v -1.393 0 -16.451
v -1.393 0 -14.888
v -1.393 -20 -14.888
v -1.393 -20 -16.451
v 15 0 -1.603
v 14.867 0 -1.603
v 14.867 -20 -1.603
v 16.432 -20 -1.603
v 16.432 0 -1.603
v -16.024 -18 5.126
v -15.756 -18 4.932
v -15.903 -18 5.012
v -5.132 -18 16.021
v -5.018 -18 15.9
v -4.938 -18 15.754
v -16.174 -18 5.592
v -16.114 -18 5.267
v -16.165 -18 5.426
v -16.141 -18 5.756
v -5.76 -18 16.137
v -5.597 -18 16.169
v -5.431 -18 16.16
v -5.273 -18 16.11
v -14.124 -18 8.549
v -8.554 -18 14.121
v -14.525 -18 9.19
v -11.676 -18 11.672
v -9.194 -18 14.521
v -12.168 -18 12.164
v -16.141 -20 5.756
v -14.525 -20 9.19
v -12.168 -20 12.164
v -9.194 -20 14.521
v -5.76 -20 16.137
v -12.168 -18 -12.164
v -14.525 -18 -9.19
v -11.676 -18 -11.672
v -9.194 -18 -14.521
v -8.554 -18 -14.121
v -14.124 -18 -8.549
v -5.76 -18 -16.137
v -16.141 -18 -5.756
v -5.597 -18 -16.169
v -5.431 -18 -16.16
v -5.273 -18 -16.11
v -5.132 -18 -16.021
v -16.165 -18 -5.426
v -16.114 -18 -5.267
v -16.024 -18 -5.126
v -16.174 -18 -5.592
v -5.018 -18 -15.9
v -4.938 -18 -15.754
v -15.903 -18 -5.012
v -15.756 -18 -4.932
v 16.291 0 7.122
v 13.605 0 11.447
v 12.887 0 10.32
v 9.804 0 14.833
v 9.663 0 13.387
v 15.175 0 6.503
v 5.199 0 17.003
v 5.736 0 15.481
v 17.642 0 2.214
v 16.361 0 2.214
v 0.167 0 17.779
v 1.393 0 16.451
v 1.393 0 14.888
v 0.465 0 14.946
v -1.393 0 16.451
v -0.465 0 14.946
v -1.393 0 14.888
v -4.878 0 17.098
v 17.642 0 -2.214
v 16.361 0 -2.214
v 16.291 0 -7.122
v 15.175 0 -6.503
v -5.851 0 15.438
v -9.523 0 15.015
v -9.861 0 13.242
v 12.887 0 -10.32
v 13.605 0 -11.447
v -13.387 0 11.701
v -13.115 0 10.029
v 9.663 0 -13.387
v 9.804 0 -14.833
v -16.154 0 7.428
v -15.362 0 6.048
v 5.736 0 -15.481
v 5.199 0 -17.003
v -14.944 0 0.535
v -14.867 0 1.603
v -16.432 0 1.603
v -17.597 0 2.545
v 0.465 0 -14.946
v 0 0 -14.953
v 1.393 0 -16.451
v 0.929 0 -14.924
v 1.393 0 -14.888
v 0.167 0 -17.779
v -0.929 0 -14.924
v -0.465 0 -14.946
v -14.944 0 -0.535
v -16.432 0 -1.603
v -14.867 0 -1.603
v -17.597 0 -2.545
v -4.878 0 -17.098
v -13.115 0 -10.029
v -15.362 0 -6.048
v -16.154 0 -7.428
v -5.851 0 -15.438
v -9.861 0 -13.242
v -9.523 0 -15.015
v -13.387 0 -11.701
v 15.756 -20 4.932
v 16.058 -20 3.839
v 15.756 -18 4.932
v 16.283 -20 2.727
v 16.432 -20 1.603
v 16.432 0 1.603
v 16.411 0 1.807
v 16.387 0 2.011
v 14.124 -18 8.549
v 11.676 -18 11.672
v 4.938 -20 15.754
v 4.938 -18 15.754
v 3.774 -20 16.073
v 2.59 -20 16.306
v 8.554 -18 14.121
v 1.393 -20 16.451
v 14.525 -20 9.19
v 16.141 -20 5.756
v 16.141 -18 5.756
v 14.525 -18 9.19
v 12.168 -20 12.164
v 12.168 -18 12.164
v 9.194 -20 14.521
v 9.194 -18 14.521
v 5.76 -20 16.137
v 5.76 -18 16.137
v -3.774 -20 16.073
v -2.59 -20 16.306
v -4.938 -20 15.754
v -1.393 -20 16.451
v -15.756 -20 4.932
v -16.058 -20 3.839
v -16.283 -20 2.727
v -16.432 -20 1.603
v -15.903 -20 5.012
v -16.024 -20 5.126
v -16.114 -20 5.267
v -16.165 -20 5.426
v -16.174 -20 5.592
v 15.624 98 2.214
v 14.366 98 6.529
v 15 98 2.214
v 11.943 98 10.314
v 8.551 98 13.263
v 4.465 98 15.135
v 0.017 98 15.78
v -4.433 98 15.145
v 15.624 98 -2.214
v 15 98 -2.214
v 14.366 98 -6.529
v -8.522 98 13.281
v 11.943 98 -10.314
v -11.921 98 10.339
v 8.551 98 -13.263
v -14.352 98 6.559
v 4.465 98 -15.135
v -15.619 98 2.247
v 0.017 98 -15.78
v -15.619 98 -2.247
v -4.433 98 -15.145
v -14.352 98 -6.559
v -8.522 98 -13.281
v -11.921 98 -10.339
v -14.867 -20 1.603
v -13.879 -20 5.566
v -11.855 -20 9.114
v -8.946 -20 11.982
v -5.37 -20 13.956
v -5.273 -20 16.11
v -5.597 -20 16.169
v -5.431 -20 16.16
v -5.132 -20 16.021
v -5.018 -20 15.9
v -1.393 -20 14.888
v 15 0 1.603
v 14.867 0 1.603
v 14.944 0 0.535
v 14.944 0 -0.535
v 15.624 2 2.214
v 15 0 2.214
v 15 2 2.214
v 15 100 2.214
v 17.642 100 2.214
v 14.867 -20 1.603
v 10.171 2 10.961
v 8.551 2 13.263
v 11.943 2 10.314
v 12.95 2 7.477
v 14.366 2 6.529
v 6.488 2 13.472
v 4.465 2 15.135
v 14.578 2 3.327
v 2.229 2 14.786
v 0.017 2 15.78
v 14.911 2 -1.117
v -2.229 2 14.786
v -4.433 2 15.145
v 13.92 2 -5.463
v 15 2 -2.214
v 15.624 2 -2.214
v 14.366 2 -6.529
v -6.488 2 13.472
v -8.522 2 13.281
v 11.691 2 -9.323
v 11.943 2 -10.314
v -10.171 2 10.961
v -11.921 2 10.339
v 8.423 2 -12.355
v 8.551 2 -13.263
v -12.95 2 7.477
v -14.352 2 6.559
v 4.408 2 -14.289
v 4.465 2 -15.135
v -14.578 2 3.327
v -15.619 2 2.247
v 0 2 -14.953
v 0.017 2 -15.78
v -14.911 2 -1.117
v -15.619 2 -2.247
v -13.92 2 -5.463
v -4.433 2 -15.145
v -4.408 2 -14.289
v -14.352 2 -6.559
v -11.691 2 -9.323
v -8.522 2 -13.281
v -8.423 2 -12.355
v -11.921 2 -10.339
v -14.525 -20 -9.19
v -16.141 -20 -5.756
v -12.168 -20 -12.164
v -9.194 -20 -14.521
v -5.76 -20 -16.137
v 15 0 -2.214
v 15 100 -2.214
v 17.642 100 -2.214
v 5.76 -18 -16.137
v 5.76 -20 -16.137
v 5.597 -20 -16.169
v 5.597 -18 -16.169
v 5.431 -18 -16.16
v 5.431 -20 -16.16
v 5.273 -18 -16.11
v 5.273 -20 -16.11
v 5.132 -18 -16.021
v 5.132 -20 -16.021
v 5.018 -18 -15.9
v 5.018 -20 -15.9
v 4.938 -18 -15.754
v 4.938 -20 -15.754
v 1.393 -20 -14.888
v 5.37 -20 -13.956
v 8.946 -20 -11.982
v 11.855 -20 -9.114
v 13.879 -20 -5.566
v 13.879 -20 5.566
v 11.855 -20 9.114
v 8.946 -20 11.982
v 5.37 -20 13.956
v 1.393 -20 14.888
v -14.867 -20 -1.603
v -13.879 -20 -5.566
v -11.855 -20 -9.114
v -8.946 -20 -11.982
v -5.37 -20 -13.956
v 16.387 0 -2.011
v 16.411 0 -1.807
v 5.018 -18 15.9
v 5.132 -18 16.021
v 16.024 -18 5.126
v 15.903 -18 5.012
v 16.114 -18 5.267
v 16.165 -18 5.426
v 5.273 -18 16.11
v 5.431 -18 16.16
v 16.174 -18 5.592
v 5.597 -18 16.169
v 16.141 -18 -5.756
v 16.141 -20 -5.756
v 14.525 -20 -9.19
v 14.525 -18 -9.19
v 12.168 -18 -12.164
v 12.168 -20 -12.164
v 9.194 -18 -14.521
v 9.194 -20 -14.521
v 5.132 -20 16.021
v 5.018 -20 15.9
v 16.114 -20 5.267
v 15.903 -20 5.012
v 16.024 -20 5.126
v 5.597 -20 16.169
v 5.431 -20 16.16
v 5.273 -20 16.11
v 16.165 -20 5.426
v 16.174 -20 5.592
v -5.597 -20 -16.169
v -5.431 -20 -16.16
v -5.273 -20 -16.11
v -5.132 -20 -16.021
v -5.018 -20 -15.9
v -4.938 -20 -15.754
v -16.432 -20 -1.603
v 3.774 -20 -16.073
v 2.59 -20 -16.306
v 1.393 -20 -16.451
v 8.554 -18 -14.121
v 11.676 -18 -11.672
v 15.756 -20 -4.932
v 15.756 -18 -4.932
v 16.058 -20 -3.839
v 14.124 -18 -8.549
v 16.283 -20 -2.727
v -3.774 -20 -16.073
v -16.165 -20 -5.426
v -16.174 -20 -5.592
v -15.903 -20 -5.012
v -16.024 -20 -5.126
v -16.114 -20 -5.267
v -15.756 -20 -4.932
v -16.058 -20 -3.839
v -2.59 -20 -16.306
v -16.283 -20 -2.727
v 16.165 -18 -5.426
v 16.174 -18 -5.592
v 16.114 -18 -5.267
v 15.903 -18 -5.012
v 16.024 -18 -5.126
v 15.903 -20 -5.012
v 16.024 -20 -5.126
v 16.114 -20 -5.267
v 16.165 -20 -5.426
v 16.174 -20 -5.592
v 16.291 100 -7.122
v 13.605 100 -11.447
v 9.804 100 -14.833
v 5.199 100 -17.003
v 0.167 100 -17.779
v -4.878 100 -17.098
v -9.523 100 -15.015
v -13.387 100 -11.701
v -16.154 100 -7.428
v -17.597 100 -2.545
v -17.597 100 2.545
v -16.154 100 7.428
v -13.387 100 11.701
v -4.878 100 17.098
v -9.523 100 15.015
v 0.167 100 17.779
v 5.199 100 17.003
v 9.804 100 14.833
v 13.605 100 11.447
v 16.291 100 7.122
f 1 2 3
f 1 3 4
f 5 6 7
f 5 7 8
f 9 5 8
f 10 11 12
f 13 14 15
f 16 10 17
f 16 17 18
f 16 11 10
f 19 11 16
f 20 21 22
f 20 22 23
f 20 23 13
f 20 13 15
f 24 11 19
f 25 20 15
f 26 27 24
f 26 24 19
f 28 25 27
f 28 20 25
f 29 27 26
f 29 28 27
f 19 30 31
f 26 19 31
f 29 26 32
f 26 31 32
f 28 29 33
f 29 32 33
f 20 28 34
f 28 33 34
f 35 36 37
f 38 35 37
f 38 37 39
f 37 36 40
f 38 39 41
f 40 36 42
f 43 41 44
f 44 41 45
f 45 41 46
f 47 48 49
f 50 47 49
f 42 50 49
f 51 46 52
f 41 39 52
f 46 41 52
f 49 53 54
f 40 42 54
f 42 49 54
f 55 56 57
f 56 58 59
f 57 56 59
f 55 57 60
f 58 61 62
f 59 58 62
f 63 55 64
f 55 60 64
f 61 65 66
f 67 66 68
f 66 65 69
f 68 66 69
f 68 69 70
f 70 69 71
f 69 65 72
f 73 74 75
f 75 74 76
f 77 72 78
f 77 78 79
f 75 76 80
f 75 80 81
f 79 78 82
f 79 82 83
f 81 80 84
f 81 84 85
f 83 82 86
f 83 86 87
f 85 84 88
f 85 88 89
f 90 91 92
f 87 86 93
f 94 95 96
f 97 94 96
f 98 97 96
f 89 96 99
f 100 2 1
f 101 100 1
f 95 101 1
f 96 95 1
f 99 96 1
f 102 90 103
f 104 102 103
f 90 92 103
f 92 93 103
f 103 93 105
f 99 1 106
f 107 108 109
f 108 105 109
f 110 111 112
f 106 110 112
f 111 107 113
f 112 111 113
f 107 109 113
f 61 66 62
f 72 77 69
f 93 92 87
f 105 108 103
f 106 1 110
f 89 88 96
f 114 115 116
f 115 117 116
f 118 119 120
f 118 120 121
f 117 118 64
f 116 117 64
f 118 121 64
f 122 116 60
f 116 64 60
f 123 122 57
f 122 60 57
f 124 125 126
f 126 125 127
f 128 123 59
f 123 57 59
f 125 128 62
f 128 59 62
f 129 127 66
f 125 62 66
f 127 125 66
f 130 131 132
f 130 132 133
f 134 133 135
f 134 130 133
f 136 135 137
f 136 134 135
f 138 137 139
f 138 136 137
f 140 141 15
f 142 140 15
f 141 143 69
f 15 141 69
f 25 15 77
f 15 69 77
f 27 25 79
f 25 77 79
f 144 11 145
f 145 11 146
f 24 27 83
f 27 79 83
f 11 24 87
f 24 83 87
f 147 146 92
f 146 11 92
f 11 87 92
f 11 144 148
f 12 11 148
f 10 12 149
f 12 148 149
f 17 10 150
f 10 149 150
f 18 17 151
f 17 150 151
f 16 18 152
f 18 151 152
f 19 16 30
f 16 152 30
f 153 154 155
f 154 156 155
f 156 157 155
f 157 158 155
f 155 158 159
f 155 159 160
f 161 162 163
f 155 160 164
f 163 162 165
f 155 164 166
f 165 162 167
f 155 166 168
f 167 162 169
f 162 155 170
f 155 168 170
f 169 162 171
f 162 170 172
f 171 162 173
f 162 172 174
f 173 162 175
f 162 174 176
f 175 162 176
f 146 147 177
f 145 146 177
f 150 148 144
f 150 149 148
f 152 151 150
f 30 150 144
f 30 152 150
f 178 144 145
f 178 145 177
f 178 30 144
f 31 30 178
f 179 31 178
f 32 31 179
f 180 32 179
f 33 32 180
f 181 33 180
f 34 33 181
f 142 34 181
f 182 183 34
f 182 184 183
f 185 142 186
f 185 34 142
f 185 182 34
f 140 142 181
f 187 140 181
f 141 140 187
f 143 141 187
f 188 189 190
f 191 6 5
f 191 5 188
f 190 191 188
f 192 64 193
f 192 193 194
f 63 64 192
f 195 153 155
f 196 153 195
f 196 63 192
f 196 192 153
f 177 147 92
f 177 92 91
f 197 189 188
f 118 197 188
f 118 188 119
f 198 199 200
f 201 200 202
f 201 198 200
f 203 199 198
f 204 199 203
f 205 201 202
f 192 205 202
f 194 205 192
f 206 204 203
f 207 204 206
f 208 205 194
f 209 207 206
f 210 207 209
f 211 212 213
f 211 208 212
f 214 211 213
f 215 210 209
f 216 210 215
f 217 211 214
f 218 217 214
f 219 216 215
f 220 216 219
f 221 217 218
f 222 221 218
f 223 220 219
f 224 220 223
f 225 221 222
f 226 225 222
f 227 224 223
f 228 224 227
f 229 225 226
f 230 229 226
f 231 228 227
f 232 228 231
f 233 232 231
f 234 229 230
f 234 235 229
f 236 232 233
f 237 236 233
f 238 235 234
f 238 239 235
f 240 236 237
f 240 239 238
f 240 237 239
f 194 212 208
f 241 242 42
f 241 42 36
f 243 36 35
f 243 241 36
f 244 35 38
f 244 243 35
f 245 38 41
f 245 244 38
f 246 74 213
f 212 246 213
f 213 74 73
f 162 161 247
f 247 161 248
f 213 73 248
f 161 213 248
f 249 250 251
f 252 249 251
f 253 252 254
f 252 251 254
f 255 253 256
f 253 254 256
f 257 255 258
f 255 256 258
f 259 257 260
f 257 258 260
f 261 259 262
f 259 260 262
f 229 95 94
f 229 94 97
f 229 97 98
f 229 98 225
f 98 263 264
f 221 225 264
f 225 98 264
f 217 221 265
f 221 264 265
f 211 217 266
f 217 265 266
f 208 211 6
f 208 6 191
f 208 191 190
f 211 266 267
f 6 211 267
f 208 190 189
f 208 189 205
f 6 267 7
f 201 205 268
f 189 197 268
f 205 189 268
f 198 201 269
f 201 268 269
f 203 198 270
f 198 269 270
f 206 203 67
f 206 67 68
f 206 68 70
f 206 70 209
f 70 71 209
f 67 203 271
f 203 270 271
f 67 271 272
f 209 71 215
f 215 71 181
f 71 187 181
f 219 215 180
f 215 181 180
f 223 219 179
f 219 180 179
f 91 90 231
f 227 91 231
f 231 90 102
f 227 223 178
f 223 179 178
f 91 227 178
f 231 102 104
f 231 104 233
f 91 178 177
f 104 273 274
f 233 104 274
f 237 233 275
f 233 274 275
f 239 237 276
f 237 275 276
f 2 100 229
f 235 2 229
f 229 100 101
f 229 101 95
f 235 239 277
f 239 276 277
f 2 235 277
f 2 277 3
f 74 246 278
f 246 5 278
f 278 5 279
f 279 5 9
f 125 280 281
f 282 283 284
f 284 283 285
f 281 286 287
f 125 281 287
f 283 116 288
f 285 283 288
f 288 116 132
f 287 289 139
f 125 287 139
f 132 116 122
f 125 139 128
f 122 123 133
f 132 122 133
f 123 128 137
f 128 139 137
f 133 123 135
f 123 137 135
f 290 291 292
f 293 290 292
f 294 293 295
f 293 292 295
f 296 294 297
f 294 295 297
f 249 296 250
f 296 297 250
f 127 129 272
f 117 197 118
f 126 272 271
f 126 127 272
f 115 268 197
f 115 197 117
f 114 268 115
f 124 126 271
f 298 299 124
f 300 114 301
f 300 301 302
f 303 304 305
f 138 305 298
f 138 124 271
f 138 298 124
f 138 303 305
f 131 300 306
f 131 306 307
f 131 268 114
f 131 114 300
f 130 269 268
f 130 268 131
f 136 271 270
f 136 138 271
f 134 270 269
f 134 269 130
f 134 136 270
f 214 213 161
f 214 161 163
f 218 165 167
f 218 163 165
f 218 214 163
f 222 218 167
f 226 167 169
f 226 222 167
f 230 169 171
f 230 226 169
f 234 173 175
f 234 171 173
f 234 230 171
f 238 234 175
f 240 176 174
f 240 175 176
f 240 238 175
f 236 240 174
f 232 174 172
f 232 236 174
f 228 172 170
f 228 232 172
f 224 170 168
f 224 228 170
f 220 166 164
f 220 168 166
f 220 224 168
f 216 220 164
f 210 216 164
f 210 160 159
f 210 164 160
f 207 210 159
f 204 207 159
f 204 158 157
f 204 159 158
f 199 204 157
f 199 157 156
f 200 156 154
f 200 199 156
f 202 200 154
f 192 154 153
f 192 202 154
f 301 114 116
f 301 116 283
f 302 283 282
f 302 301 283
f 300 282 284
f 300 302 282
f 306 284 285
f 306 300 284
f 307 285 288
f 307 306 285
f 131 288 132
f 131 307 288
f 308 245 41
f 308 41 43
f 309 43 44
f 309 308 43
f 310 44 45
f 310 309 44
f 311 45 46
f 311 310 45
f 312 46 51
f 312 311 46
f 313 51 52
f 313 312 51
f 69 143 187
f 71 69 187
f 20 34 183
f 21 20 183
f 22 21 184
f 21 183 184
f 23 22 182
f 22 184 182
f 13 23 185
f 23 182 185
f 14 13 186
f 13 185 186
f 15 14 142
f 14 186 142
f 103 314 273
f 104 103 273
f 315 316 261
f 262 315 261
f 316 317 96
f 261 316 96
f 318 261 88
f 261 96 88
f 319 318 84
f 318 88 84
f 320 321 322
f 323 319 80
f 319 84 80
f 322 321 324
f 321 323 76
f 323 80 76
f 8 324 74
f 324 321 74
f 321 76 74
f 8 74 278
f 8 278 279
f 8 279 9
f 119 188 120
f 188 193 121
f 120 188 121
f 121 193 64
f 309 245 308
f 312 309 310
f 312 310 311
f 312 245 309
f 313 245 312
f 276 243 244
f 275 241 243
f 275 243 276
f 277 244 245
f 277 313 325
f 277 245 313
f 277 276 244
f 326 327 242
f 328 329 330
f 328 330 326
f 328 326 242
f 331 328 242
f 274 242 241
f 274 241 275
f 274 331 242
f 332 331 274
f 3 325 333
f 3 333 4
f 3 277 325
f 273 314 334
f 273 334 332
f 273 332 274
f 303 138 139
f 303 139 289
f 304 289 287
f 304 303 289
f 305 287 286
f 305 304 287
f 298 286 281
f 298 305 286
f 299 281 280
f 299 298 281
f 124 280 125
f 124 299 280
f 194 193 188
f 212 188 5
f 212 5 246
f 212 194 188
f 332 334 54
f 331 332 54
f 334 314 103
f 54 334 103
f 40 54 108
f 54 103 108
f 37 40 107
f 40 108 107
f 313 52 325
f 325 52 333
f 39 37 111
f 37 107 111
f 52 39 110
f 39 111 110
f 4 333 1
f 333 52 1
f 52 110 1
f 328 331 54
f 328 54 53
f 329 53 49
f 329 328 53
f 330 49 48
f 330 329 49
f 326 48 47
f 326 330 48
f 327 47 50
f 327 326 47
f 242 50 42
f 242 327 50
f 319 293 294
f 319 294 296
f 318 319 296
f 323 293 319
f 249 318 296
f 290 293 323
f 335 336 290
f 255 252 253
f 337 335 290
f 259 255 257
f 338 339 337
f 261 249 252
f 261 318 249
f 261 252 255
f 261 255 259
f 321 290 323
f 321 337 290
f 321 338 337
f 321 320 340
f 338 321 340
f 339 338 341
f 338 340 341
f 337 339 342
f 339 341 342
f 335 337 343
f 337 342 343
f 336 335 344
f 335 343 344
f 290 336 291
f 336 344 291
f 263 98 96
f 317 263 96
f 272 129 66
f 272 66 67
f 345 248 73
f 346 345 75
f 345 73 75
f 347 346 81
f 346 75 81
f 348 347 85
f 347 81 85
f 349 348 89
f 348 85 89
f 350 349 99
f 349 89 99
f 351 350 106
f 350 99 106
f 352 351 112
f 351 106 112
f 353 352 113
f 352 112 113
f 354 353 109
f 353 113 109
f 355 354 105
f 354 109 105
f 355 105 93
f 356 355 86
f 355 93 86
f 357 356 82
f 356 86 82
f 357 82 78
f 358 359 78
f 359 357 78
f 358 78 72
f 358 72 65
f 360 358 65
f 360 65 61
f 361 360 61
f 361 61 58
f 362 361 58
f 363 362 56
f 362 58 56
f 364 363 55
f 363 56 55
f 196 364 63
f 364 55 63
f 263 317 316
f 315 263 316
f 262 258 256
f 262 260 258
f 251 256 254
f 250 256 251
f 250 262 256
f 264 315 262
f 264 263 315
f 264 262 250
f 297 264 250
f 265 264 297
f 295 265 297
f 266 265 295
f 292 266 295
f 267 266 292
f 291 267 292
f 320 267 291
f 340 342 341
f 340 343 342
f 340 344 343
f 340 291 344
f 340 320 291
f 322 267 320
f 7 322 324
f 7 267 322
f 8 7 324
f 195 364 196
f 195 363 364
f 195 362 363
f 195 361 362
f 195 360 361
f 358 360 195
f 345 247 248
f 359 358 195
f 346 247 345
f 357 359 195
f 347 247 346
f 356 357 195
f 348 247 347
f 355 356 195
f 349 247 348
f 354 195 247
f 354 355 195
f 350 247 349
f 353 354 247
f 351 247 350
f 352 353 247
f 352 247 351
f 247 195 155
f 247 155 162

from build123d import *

# Parameters (mm, degrees)
SKETCH1_R           = 17.78
BOSS_EXTRUDE1_DEPTH = 100
SHELL1_T            = 2
CUT_EXTRUDE1_START  = 20
SKETCH2_W           = 4.427976762
SKETCH2_H           = 104.269834735
CUT_EXTRUDE1_DEPTH  = 5
SKETCH4_R           = 16.51
BOSS_EXTRUDE2_DEPTH = 20
SKETCH7_R           = 14.953216008
CUT_EXTRUDE4_DEPTH  = 32
SKETCH8_W           = 2.785852998
SKETCH8_H           = 3.149177074
SKETCH8_W_2         = 3.149177073
SKETCH8_H_2         = 3.205412378
SKETCH8_H_3         = 3.711530123
CUT_EXTRUDE5_DEPTH  = 104.112835283
BOSS_EXTRUDE4_DEPTH = 2


with BuildPart() as part:
    # Sketch1 → Boss-Extrude1 (new body)
    with BuildSketch(Plane(origin=(0, 0, 0), x_dir=(1, 0, 0), z_dir=(0, 1, 0))):
        with Locations(Location((0, 0, 0), (0, 0, 90))):
            Circle(SKETCH1_R)
    extrude(amount=BOSS_EXTRUDE1_DEPTH)

    # Shell1 (no face opened: a closed hollow body)
    add(offset(amount=-SHELL1_T, mode=Mode.PRIVATE), mode=Mode.SUBTRACT)

    # Sketch2 → Cut-Extrude1 (cut, symmetric)
    with BuildSketch(Plane(origin=(0, 0, 0), x_dir=(0, 0, -1), z_dir=(1, 0, 0)).offset(CUT_EXTRUDE1_START)):
        with Locations((0, 52.134917368)):
            Rectangle(SKETCH2_W, SKETCH2_H)
    extrude(amount=CUT_EXTRUDE1_DEPTH, both=True, mode=Mode.SUBTRACT)

    # Sketch4 → Boss-Extrude2 (add)
    with BuildSketch(Plane.XZ):
        with Locations(Location((0, 0, 0), (0, 0, 7.706571309))):
            Circle(SKETCH4_R)
    extrude(amount=BOSS_EXTRUDE2_DEPTH)

    # Sketch7 → Cut-Extrude4 (cut)
    with BuildSketch(Plane(origin=(0, -20, 0), x_dir=(-1, 0, 0), z_dir=(0, -1, 0))):
        with Locations(Location((0, 0, 0), (0, 0, 90))):
            Circle(SKETCH7_R)
    extrude(amount=-CUT_EXTRUDE4_DEPTH, mode=Mode.SUBTRACT)

    # Sketch8 → Cut-Extrude5 (cut, through all)
    with BuildSketch(Plane(origin=(0, 0, 0), x_dir=(1, 0, 0), z_dir=(0, 1, 0))):
        with Locations((0, 15.774003019)):
            Rectangle(SKETCH8_W, SKETCH8_H)
        with Locations((15.845399854, 0)):
            Rectangle(SKETCH8_W_2, SKETCH8_H_2)
        with Locations((0, -16.055179544)):
            Rectangle(SKETCH8_W, SKETCH8_H_3)
        with Locations((-15.845399854, 0)):
            Rectangle(SKETCH8_W_2, SKETCH8_H_2)
    extrude(amount=-CUT_EXTRUDE5_DEPTH, mode=Mode.SUBTRACT)

    # Sketch9 → Boss-Extrude4 (add)
    with BuildSketch(Plane.XZ.offset(20)):
        with BuildLine():
            ThreePointArc((16.14116018, 5.756014083), (12.168131115, 12.163725441), (5.760419757, 16.136754506))
            ThreePointArc((5.760419757, 16.136754506), (4.92620467, 15.722665224), (5.340293953, 14.888450137))
            ThreePointArc((5.340293953, 14.888450137), (11.236796189, 11.232390515), (14.892855811, 5.335888279))
            ThreePointArc((14.892855811, 5.335888279), (15.727070898, 4.921798996), (16.14116018, 5.756014083))
        make_face()
        with BuildLine():
            ThreePointArc((16.14116018, -5.756014083), (12.168131115, -12.163725441), (5.760419757, -16.136754506))
            ThreePointArc((5.760419757, -16.136754506), (4.92620467, -15.722665224), (5.340293953, -14.888450137))
            ThreePointArc((5.340293953, -14.888450137), (11.236796189, -11.232390515), (14.892855811, -5.335888279))
            ThreePointArc((14.892855811, -5.335888279), (15.727070898, -4.921798996), (16.14116018, -5.756014083))
        make_face()
        with BuildLine():
            ThreePointArc((-16.14116018, -5.756014083), (-12.168131115, -12.163725441), (-5.760419757, -16.136754506))
            ThreePointArc((-5.760419757, -16.136754506), (-4.92620467, -15.722665224), (-5.340293953, -14.888450137))
            ThreePointArc((-5.340293953, -14.888450137), (-11.236796189, -11.232390515), (-14.892855811, -5.335888279))
            ThreePointArc((-14.892855811, -5.335888279), (-15.727070898, -4.921798996), (-16.14116018, -5.756014083))
        make_face()
        with BuildLine():
            ThreePointArc((-16.14116018, 5.756014083), (-12.168131115, 12.163725441), (-5.760419757, 16.136754506))
            ThreePointArc((-5.760419757, 16.136754506), (-4.92620467, 15.722665224), (-5.340293953, 14.888450137))
            ThreePointArc((-5.340293953, 14.888450137), (-11.236796189, 11.232390515), (-14.892855811, 5.335888279))
            ThreePointArc((-14.892855811, 5.335888279), (-15.727070898, 4.921798996), (-16.14116018, 5.756014083))
        make_face()
    extrude(amount=-BOSS_EXTRUDE4_DEPTH)


solid = part.part
